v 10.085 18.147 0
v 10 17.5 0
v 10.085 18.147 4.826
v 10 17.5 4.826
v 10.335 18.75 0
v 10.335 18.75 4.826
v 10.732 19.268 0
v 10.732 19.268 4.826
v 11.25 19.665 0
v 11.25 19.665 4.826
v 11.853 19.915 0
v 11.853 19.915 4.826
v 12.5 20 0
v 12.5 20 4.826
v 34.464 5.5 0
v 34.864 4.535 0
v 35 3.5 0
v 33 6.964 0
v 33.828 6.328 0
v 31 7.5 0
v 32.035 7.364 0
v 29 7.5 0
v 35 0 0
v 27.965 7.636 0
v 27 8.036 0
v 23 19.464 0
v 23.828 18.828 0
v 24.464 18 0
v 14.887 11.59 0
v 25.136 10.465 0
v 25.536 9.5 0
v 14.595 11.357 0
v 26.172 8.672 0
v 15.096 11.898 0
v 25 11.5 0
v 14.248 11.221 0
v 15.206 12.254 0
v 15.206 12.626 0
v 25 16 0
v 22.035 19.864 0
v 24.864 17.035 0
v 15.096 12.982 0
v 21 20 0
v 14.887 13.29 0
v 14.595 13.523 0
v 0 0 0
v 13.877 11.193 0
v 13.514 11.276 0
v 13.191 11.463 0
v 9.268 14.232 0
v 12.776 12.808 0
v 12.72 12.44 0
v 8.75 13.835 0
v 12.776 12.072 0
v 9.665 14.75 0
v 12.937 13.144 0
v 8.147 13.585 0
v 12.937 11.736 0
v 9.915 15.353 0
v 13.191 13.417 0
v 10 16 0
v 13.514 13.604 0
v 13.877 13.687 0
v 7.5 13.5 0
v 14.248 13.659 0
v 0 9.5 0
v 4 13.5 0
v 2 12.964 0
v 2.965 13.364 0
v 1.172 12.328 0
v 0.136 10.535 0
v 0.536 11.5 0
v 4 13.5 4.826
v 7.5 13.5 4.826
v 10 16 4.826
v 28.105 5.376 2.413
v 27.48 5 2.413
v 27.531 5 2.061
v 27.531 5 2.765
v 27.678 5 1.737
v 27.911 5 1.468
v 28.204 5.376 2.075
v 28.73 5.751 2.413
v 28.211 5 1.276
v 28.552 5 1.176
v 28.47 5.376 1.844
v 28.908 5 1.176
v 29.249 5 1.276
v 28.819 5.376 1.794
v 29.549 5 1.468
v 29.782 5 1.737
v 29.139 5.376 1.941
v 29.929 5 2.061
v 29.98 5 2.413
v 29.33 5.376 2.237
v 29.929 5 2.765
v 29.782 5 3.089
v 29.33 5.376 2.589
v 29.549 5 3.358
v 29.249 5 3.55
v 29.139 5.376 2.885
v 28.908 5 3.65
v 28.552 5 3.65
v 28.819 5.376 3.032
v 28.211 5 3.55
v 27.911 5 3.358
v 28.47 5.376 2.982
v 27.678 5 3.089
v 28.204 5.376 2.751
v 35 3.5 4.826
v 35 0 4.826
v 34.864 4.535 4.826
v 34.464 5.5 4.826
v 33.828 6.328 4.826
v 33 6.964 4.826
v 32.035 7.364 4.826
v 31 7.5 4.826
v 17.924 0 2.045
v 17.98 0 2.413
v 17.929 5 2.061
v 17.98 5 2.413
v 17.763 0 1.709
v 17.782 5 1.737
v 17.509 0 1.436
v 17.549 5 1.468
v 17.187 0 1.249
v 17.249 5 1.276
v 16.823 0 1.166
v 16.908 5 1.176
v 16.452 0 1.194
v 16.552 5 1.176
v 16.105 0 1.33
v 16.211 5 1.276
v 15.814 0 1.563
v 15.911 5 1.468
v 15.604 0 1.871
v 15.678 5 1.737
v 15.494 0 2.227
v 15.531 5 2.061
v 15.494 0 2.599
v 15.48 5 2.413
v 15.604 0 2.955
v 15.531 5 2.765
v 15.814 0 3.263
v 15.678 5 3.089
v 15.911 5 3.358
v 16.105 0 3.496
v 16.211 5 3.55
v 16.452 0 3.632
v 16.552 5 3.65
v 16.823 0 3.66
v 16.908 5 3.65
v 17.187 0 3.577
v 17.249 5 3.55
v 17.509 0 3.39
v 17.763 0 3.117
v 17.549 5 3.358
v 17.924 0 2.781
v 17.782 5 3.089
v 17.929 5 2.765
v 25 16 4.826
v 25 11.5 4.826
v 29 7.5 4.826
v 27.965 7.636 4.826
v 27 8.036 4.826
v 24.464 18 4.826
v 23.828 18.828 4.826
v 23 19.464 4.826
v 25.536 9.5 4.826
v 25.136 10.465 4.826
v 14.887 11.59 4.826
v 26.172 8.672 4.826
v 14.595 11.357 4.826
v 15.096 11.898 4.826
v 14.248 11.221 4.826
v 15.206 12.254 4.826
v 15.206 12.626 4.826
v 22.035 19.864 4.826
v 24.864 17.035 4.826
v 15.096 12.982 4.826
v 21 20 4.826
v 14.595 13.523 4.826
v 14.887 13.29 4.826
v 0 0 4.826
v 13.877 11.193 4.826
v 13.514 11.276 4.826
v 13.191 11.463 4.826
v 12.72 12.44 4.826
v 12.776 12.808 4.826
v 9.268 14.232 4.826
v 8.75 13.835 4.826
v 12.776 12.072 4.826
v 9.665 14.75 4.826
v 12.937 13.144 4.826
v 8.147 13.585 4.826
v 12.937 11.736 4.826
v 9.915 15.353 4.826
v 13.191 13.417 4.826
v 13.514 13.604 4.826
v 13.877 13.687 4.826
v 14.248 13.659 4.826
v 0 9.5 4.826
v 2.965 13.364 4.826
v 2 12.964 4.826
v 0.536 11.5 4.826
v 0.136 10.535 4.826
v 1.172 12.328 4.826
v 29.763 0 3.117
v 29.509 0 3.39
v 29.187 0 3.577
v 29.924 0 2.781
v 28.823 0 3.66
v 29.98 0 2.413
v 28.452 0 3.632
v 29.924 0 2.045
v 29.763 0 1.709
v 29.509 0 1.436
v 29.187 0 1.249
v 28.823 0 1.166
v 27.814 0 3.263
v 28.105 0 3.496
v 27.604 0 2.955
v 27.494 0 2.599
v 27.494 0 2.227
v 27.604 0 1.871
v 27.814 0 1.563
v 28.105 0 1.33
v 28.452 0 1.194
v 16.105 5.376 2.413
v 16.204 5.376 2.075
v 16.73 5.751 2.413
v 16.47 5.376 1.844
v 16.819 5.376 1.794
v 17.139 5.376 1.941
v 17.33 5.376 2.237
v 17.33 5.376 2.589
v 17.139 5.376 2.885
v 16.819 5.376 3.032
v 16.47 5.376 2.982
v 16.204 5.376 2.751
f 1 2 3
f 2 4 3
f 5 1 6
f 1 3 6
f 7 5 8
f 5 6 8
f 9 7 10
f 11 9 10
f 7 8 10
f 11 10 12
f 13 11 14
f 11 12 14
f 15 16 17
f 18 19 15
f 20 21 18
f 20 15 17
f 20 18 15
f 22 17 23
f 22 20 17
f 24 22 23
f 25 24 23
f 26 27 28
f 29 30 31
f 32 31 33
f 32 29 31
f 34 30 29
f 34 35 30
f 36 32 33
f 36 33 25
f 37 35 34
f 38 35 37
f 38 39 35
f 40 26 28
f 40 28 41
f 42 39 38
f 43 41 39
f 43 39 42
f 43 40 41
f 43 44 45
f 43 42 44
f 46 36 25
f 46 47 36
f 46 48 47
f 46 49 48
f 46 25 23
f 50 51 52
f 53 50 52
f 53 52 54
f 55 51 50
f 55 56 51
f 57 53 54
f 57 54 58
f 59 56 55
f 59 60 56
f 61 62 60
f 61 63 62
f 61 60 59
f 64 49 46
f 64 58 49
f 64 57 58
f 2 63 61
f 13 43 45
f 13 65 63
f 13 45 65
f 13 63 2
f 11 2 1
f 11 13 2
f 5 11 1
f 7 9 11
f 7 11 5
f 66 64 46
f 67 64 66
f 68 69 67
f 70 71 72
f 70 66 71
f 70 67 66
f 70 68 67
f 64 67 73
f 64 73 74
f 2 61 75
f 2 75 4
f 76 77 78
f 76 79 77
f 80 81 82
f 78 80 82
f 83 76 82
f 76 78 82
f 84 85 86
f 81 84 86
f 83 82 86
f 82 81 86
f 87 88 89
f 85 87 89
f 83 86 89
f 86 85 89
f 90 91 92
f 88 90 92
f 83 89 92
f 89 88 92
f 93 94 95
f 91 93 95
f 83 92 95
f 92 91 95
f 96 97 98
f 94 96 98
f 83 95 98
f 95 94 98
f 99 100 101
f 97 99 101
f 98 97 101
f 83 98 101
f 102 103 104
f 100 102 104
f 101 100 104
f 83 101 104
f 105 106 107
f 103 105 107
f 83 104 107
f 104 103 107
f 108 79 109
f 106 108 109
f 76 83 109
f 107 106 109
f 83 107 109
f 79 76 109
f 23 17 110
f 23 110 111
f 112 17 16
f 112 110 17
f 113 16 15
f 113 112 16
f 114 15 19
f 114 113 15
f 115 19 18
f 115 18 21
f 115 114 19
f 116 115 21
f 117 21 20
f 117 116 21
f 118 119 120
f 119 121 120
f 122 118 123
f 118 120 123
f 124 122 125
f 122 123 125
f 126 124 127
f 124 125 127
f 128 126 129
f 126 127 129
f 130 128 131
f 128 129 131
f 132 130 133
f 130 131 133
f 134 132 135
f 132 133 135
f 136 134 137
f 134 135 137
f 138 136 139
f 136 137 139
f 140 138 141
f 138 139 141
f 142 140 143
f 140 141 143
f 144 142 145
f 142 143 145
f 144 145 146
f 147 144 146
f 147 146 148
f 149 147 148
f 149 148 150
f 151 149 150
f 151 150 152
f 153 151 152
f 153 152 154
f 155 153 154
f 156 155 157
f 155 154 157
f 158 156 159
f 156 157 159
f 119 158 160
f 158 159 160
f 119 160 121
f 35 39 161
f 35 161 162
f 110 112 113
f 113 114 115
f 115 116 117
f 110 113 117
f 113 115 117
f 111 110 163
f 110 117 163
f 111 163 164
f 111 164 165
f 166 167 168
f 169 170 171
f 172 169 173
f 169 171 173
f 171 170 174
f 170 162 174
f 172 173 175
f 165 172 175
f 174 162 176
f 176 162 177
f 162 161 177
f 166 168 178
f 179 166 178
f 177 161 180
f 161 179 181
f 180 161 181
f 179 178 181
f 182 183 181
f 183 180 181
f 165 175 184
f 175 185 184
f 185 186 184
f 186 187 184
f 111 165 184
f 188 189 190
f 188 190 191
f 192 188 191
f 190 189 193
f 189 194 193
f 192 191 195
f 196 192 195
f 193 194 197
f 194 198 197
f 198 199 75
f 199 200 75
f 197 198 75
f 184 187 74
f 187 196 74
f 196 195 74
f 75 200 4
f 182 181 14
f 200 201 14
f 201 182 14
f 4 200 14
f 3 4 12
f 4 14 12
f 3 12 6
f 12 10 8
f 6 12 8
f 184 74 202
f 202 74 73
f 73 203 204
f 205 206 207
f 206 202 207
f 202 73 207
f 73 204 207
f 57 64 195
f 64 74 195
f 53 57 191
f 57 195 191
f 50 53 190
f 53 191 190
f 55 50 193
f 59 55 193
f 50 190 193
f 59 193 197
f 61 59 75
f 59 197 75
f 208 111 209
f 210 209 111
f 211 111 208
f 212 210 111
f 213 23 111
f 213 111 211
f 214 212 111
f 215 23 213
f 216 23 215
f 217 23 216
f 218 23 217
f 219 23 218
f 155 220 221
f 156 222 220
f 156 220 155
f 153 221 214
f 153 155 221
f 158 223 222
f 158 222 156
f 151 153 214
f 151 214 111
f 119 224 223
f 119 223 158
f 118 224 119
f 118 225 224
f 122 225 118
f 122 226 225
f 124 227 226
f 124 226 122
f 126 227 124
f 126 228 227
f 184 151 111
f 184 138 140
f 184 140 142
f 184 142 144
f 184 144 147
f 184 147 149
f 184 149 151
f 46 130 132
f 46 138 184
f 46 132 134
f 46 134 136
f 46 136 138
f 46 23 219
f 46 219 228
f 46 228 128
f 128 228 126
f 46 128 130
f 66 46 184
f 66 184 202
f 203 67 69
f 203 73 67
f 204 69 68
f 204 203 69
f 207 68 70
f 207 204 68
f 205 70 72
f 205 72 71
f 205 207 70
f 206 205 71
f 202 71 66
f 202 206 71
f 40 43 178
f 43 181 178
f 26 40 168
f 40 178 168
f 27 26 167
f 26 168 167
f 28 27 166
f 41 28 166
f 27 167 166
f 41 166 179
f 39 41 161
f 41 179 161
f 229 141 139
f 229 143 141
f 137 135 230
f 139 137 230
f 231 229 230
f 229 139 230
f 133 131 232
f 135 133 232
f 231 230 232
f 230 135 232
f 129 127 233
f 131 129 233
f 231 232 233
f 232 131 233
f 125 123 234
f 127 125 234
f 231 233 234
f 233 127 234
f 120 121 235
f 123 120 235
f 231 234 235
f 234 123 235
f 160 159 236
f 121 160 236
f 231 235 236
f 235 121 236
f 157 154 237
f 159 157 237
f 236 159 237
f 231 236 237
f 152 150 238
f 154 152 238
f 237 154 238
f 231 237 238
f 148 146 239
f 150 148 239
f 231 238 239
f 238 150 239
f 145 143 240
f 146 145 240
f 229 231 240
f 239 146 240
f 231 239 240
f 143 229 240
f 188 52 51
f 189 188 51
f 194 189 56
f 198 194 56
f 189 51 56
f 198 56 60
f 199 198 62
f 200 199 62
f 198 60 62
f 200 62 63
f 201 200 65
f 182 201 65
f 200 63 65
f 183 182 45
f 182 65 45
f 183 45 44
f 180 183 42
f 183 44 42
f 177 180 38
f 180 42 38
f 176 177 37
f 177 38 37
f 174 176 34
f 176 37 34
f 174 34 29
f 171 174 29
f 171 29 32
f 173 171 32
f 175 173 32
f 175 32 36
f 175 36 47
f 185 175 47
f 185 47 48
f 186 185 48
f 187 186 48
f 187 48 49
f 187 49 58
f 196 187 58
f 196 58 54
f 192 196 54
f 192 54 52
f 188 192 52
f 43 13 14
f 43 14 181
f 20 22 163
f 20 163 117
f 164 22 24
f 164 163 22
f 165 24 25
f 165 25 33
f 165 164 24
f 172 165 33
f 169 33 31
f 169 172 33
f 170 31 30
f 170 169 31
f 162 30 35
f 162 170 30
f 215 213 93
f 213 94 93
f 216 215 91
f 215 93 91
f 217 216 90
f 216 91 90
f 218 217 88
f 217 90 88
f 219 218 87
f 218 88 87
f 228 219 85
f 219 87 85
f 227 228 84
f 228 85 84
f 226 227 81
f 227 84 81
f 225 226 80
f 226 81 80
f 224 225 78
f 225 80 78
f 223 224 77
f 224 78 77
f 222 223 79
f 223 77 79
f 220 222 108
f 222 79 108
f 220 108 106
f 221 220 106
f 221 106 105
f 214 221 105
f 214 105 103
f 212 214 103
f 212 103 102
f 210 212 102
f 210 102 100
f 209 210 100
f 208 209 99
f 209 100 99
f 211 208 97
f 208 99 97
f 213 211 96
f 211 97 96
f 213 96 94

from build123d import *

# Parameters (mm, degrees)
BOSS_EXTRUDE1_DEPTH       = 4.826
M3X0_5_TAPPED_HOLE2_D     = 2.5
M3X0_5_TAPPED_HOLE3_D     = 2.5
M3X0_5_TAPPED_HOLE3_DEPTH = 5
M3X0_5_TAPPED_HOLE3_TIP   = 0.751075774
FILLET1_R                 = 2.5
FILLET2_R                 = 4


with BuildPart() as part:
    # Sketch1 → Boss-Extrude1 (new body)
    with BuildSketch(Plane.XY):
        Polygon((0, 0), (0, 13.5), (10, 13.5), (10, 20), (25, 20), (25, 7.5), (35, 7.5), (35, 0), align=None)
    extrude(amount=BOSS_EXTRUDE1_DEPTH)

    # M3x0.5 Tapped Hole2 (through all)
    with Locations(Plane.XY.offset(4.826)):
        with Locations((13.97024649, 12.44)):
            Hole(M3X0_5_TAPPED_HOLE2_D / 2)

    # M3x0.5 Tapped Hole3
    with Locations(Plane(origin=(0, 0, 0), x_dir=(-1, 0, 0), z_dir=(0, -1, 0))):
        with Locations((-16.73, -2.413), (-28.73, -2.413)):
            Hole(M3X0_5_TAPPED_HOLE3_D / 2, depth=M3X0_5_TAPPED_HOLE3_DEPTH)
            with Locations((0, 0, -(M3X0_5_TAPPED_HOLE3_DEPTH + M3X0_5_TAPPED_HOLE3_TIP / 2))):  # 118° drill point
                Cone(0, M3X0_5_TAPPED_HOLE3_D / 2, M3X0_5_TAPPED_HOLE3_TIP, mode=Mode.SUBTRACT)

    # Fillet1
    fillet1_edges = [part.edges().sort_by_distance(p)[0] for p in [
        (10, 20, 2.413),
        (10, 13.5, 2.413),
    ]]
    fillet(fillet1_edges, radius=FILLET1_R)

    # Fillet2
    fillet2_edges = [part.edges().sort_by_distance(p)[0] for p in [
        (25, 20, 2.413),
        (25, 7.5, 2.413),
        (35, 7.5, 2.413),
        (0, 13.5, 2.413),
    ]]
    fillet(fillet2_edges, radius=FILLET2_R)


solid = part.part
